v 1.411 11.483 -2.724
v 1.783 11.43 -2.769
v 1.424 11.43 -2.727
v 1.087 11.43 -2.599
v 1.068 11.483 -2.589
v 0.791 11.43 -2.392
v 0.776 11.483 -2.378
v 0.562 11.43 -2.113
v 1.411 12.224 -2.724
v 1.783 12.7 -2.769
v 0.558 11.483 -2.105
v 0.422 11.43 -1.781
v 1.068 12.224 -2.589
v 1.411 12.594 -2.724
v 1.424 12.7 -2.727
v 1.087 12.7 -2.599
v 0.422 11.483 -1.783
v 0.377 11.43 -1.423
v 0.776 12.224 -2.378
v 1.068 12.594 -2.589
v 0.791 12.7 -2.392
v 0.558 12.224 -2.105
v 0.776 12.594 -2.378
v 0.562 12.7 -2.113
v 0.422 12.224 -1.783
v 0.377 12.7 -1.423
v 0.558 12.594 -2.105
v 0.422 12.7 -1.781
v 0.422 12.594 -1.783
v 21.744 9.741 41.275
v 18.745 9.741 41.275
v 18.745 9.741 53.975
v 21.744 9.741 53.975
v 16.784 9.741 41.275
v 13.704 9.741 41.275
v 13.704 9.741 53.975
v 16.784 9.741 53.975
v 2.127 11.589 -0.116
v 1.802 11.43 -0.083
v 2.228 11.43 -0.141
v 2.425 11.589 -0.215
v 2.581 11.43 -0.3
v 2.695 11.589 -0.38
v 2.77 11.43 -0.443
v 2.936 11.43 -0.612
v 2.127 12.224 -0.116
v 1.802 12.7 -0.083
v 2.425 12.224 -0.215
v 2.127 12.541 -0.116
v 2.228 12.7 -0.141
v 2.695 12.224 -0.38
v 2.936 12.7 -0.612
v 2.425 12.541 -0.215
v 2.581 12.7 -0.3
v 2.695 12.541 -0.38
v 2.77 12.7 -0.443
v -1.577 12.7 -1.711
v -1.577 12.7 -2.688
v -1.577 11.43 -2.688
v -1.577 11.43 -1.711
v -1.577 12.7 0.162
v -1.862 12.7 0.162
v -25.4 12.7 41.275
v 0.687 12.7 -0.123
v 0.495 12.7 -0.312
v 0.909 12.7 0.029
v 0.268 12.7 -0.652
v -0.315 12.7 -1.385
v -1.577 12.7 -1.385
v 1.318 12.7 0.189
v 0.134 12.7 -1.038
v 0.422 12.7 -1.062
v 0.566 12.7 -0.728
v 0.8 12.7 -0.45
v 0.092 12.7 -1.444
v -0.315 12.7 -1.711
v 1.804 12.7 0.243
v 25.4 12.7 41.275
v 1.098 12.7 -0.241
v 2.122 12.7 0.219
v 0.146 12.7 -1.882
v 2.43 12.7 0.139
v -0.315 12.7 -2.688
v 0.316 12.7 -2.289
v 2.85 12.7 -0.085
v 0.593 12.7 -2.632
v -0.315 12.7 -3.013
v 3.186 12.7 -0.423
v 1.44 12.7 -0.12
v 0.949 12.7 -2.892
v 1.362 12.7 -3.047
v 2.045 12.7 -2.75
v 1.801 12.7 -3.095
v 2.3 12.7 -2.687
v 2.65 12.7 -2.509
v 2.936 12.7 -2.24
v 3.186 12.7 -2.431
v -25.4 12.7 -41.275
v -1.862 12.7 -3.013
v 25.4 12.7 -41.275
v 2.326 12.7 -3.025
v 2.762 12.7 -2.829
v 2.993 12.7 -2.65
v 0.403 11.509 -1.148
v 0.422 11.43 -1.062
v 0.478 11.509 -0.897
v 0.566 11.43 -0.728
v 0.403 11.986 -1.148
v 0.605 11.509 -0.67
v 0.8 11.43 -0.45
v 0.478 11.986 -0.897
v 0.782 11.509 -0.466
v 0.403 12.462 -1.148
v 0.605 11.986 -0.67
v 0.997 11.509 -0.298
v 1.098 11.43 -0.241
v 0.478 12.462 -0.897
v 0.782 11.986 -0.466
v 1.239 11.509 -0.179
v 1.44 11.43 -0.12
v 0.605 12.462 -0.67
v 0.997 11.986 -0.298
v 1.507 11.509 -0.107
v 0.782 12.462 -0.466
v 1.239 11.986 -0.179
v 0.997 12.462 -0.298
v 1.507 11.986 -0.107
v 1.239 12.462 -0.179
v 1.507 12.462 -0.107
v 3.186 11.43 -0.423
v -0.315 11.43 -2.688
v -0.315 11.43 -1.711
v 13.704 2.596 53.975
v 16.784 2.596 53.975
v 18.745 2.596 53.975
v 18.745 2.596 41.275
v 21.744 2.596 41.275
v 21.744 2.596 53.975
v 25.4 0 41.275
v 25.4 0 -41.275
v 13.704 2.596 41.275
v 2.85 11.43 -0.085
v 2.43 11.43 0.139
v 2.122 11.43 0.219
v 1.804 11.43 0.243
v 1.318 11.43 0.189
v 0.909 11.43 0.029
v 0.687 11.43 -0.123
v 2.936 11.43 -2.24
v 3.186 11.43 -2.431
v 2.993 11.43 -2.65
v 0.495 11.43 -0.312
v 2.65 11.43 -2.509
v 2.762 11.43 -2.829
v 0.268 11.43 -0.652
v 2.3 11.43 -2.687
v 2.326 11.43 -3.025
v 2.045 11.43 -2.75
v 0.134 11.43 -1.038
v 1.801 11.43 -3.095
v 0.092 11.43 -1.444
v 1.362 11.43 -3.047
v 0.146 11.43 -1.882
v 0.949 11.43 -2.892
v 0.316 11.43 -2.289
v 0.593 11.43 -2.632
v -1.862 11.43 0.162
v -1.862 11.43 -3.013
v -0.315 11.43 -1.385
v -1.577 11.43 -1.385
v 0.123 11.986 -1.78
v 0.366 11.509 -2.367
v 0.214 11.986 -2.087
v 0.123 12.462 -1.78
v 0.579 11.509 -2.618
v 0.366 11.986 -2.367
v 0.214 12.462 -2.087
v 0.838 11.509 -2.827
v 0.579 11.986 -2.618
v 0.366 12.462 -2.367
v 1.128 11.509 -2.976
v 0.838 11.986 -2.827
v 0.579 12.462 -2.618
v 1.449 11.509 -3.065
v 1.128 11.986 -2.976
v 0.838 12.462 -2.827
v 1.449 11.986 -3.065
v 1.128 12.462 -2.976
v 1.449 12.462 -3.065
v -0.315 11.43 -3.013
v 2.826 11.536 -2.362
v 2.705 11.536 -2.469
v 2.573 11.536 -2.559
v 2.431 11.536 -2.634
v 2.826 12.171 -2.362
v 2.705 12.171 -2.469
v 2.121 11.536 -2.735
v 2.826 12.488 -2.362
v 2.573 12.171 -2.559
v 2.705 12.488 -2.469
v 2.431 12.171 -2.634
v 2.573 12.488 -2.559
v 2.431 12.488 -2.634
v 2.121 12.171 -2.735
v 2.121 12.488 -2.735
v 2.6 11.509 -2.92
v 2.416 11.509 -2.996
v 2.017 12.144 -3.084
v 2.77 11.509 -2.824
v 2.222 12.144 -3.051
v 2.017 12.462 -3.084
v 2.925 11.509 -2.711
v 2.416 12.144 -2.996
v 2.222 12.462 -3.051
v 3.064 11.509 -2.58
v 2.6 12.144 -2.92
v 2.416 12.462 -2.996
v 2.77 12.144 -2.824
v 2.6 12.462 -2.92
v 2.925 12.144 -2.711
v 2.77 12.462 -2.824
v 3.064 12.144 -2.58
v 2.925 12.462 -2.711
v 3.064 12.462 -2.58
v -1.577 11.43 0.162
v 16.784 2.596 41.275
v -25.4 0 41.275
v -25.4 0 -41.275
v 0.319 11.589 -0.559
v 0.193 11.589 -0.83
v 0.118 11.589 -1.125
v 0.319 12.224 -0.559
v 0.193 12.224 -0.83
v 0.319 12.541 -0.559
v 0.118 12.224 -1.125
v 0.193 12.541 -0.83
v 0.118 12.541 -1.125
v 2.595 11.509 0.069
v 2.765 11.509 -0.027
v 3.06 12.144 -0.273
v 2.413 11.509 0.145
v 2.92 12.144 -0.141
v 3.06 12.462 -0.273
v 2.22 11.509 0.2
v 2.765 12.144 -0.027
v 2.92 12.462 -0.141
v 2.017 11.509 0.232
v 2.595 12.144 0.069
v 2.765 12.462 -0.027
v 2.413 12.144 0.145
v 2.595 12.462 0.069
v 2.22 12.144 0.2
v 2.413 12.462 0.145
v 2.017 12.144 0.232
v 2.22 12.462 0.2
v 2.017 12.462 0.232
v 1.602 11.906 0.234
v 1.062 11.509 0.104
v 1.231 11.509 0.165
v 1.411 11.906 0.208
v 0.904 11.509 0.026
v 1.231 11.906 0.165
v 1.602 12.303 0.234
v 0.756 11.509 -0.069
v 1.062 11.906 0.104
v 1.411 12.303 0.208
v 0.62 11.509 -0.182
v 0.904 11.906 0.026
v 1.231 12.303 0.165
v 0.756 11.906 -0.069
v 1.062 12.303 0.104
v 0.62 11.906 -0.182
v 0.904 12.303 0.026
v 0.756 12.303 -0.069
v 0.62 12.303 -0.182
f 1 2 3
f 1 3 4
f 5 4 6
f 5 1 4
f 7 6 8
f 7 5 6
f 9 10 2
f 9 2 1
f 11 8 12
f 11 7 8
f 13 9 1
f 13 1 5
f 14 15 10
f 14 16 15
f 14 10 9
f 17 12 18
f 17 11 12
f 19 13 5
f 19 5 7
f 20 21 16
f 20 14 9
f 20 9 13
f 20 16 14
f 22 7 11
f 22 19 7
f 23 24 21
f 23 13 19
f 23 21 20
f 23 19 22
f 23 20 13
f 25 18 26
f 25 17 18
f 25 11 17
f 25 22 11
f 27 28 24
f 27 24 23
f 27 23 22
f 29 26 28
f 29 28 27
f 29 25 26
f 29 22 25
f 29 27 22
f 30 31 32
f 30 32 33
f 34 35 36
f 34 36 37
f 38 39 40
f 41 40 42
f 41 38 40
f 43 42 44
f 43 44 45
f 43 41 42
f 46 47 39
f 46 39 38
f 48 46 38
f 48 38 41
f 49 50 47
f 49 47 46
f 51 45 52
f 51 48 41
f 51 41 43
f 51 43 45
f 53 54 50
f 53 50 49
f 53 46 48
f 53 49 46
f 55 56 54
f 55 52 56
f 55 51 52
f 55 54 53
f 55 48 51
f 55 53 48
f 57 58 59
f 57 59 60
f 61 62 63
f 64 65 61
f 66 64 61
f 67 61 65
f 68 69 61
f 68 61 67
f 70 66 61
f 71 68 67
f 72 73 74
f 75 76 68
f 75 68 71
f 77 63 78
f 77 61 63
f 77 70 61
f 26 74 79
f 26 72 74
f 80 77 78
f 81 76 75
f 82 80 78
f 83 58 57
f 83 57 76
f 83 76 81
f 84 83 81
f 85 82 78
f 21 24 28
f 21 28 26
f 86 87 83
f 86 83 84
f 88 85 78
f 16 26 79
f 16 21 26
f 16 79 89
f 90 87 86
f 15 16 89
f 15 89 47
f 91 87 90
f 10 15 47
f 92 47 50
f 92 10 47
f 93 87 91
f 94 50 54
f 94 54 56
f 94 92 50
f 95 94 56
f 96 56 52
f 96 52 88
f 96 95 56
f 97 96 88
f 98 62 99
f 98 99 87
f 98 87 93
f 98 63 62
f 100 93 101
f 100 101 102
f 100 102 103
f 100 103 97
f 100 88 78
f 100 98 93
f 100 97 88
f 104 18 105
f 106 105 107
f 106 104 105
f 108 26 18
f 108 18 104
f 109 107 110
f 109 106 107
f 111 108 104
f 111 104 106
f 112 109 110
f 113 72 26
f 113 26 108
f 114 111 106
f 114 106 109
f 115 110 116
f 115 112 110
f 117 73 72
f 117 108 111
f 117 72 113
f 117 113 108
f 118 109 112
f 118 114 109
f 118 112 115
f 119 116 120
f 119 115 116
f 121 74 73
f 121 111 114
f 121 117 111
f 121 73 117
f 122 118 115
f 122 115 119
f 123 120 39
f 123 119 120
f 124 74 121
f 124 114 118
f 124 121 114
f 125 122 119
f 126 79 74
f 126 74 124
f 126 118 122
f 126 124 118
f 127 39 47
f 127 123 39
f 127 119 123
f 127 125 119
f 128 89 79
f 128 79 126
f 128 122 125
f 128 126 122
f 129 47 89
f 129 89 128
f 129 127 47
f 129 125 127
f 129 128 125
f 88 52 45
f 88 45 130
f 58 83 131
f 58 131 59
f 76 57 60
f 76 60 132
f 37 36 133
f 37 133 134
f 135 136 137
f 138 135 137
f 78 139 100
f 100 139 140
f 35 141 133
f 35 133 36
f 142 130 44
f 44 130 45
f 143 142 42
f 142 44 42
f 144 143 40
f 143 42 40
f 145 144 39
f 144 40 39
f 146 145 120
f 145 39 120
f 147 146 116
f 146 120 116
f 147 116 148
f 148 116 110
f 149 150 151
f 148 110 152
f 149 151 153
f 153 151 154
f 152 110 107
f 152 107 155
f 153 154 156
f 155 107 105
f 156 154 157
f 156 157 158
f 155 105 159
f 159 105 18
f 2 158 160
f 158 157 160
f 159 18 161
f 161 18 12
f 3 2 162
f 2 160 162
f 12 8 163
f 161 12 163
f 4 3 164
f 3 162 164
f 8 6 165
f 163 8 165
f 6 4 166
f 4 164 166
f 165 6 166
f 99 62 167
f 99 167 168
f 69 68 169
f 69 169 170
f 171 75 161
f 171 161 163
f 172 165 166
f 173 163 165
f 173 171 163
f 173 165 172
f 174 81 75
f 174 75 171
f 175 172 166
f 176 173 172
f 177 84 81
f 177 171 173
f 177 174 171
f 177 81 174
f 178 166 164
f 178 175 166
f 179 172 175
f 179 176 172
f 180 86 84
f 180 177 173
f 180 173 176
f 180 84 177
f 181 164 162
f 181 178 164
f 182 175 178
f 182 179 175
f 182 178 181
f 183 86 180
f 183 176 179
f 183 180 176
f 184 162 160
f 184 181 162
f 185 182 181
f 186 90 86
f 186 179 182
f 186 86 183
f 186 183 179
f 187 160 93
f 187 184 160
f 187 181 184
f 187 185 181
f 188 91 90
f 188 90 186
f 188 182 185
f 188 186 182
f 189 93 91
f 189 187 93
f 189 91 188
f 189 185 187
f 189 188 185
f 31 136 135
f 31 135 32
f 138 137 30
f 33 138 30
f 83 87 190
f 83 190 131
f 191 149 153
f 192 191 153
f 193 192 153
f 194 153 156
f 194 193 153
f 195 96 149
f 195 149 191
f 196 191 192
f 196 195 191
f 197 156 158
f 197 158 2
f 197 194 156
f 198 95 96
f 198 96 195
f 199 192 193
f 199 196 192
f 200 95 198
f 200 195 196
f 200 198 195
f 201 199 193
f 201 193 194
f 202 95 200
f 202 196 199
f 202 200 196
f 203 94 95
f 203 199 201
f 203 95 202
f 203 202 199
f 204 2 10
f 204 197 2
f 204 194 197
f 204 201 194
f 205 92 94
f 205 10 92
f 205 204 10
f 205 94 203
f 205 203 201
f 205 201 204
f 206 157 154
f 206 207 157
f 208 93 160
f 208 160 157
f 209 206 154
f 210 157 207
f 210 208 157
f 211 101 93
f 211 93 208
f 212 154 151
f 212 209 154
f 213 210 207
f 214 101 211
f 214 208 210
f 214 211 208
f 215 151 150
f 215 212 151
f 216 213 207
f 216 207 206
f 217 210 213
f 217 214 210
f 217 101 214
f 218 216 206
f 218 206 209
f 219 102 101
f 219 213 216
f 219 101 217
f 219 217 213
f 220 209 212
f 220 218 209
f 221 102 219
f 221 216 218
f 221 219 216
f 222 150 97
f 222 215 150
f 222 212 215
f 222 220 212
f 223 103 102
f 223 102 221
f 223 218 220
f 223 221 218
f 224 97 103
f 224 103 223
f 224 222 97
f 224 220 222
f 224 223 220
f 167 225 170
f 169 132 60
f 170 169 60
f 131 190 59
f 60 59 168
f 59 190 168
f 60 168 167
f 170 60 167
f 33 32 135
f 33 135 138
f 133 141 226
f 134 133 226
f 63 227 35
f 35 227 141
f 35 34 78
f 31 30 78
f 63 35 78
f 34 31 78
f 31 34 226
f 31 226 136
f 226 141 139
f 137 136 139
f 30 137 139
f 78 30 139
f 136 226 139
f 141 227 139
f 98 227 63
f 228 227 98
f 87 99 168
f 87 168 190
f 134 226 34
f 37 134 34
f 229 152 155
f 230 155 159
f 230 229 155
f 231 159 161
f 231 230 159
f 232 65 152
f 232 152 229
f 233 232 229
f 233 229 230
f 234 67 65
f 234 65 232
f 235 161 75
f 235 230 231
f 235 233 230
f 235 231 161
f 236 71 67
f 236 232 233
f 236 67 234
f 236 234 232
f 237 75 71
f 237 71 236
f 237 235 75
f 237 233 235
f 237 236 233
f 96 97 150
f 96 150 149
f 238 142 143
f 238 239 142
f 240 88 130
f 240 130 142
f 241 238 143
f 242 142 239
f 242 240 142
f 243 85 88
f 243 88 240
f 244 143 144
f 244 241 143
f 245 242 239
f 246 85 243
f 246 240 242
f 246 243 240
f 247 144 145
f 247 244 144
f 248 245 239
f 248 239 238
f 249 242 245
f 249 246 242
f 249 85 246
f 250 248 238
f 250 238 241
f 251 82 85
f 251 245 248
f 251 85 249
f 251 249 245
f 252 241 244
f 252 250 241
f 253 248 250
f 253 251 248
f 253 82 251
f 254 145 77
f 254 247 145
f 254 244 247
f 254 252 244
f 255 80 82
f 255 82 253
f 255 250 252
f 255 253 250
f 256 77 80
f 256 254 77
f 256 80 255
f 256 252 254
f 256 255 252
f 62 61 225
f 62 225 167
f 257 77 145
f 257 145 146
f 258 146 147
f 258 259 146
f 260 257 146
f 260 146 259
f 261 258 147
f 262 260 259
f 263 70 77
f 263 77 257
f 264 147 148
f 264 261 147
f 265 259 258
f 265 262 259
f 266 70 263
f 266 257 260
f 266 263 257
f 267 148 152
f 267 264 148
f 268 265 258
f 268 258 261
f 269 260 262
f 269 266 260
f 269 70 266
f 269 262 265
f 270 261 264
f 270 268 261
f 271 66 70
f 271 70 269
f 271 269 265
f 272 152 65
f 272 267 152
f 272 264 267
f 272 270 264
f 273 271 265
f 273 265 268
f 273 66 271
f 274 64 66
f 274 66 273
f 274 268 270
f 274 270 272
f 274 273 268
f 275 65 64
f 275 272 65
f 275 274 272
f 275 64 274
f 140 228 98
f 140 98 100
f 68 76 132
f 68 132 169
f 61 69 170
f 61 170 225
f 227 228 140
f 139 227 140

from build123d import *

# Parameters (mm, degrees)
SKETCH1_W           = 50.8
SKETCH1_H           = 82.55
BOSS_EXTRUDE1_DEPTH = 12.7
CUT_EXTRUDE1_DEPTH  = 1.27
SKETCH3_W           = 2.998982734
SKETCH3_H           = 7.14554636
SKETCH3_W_2         = 3.079931229
BOSS_EXTRUDE2_DEPTH = 12.7


with BuildPart() as part:
    # Sketch1 → Boss-Extrude1 (new body)
    with BuildSketch(Plane(origin=(0, 0, 0), x_dir=(1, 0, 0), z_dir=(0, 1, 0))):
        Rectangle(SKETCH1_W, SKETCH1_H)
    extrude(amount=BOSS_EXTRUDE1_DEPTH)

    # Sketch2 → Cut-Extrude1 (cut)
    with BuildSketch(Plane(origin=(0, 12.7, 0), x_dir=(1, 0, 0), z_dir=(0, 1, 0))):
        Polygon((-1.861676083, 3.013416612), (-0.314881211, 3.013416612), (-0.314881211, 2.687775586), (-1.576740185, 2.687775586), (-1.576740185, 1.710852509), (-0.314881211, 1.710852509), (-0.314881211, 1.385211483), (-1.576740185, 1.385211483), (-1.576740185, -0.161583388), (-1.861676083, -0.161583388), align=None)
        with BuildLine():
            Line((3.185759815, 2.430824464), (2.936440905, 2.240019176))
            add(Edge.make_bspline(
                [(2.936440905, 2.240019176), (2.918655563, 2.261215448), (2.883324665, 2.303322222), (2.826483817, 2.36244938), (2.767245898, 2.417844296), (2.705633552, 2.469770858), (2.64053778, 2.51641321), (2.573535484, 2.560201996), (2.503505828, 2.599452015), (2.406666755, 2.647043439), (2.279986207, 2.696706022), (2.120515174, 2.73834681), (1.954044392, 2.764854591), (1.840472284, 2.767725555), (1.782704927, 2.769185842)],
                knots=[0, 0, 0, 0, 0.757959112, 1.505699292, 2.245454638, 2.979532153, 3.711538275, 4.438200793, 5.171680507, 5.909471876, 7.393775596, 8.890124382, 10.418191784, 12, 12, 12, 12], degree=3))
            add(Edge.make_bspline(
                [(1.782704927, 2.769185842), (1.750879363, 2.768819391), (1.687523605, 2.768089888), (1.593499633, 2.758465896), (1.501231365, 2.744939298), (1.410778821, 2.724868469), (1.322257137, 2.699493308), (1.235087601, 2.669171682), (1.150532271, 2.631656935), (1.06742144, 2.590193013), (0.987793156, 2.543359546), (0.912450363, 2.492275291), (0.841667849, 2.437511896), (0.775389622, 2.378864107), (0.713547926, 2.316596042), (0.656590866, 2.250044104), (0.604715529, 2.179421061), (0.556893657, 2.105658184), (0.514064963, 2.02897033), (0.478205715, 1.949073659), (0.446451069, 1.867336366), (0.421323898, 1.782834956), (0.40143523, 1.696164018), (0.387712278, 1.607090946), (0.378197736, 1.515801822), (0.377471861, 1.453926232), (0.377105969, 1.422736523)],
                knots=[0, 0, 0, 0, 1.054917814, 2.100044995, 3.131103042, 4.146048494, 5.169673617, 6.183595914, 7.203665975, 8.234915748, 9.262203917, 10.264457458, 11.251630812, 12.227803204, 13.197192746, 14.159520551, 15.12972552, 16.100847026, 17.073214652, 18.039054194, 19.002613845, 19.979014051, 20.95965708, 21.949030935, 22.966165397, 24, 24, 24, 24], degree=3))
            add(Edge.make_bspline(
                [(0.377105969, 1.422736523), (0.378250619, 1.375808826), (0.380497988, 1.283672517), (0.400498976, 1.14871632), (0.430892881, 1.019429709), (0.476445582, 0.896620852), (0.532615007, 0.778775413), (0.603590419, 0.66788731), (0.685792563, 0.562280855), (0.780384358, 0.464451896), (0.884166777, 0.375085873), (0.995516668, 0.296390703), (1.114156701, 0.230790774), (1.23877693, 0.176202594), (1.370336333, 0.134241134), (1.508598332, 0.104700822), (1.653262214, 0.085431129), (1.752113026, 0.083586284), (1.802421474, 0.082647381)],
                knots=[0, 0, 0, 0, 1.029171465, 2.020641659, 2.987623507, 3.938342917, 4.889210282, 5.84687017, 6.821220943, 7.821438502, 8.827599549, 9.822697543, 10.807740252, 11.797342354, 12.80366471, 13.83203677, 14.896651826, 16, 16, 16, 16], degree=3))
            add(Edge.make_bspline(
                [(1.802421474, 0.082647381), (1.857850341, 0.084179345), (1.966947613, 0.087194618), (2.126938608, 0.11273908), (2.280096767, 0.154157334), (2.426430328, 0.212121877), (2.565526757, 0.28747396), (2.697603727, 0.37882132), (2.822772723, 0.487032879), (2.89803953, 0.569658288), (2.936440905, 0.611814047)],
                knots=[0, 0, 0, 0, 1.028121516, 2.023589091, 2.998037872, 3.967518031, 4.937445131, 5.927275754, 6.942489185, 8, 8, 8, 8], degree=3))
            Line((2.936440905, 0.611814047), (3.185759815, 0.422916812))
            add(Edge.make_bspline(
                [(3.185759815, 0.422916812), (3.16569553, 0.397028359), (3.125663066, 0.345375458), (3.060840436, 0.27255755), (2.992553173, 0.204064603), (2.920294065, 0.140448832), (2.844894354, 0.080437281), (2.765000185, 0.025734906), (2.681661848, -0.024421825), (2.595161714, -0.070347678), (2.505591686, -0.111094038), (2.413059092, -0.145977098), (2.317962784, -0.176026105), (2.220298416, -0.200747505), (2.119863408, -0.220043417), (2.017020192, -0.232942693), (1.911546805, -0.241780001), (1.84038923, -0.242585468), (1.804329526, -0.242993645)],
                knots=[0, 0, 0, 0, 0.986787822, 1.968848986, 2.935600012, 3.899624008, 4.868462664, 5.837806735, 6.815139263, 7.798259679, 8.787526145, 9.778297419, 10.776456485, 11.791383307, 12.812564526, 13.85620153, 14.913611965, 16, 16, 16, 16], degree=3))
            add(Edge.make_bspline(
                [(1.804329526, -0.242993645), (1.770181343, -0.24275598), (1.702657538, -0.242286028), (1.602963671, -0.234673133), (1.505908837, -0.224286586), (1.411770426, -0.208647324), (1.32003472, -0.190192101), (1.231533333, -0.165453176), (1.145395392, -0.137740717), (1.061966969, -0.105169765), (0.981177098, -0.0684158), (0.903286355, -0.026876314), (0.828330563, 0.019099377), (0.755572788, 0.068497851), (0.686087837, 0.122905832), (0.619273568, 0.181567708), (0.554755321, 0.24428576), (0.5148386, 0.289511234), (0.49476923, 0.312249745)],
                knots=[0, 0, 0, 0, 1.114604814, 2.203992996, 3.262667896, 4.300477797, 5.318619304, 6.316056647, 7.298880507, 8.271930387, 9.238335007, 10.195173496, 11.151986948, 12.108099108, 13.064862484, 14.031167946, 15.010108607, 16, 16, 16, 16], degree=3))
            add(Edge.make_bspline(
                [(0.49476923, 0.312249745), (0.462624039, 0.351747823), (0.398721742, 0.430267125), (0.316964872, 0.557526551), (0.246981019, 0.69039414), (0.190397148, 0.829567933), (0.146162382, 0.974735634), (0.115518013, 1.125970422), (0.095604771, 1.283131055), (0.093327581, 1.390025856), (0.092170071, 1.444361123)],
                knots=[0, 0, 0, 0, 0.994628077, 1.977248131, 2.950237994, 3.925870899, 4.908910175, 5.911660606, 6.938484602, 8, 8, 8, 8], degree=3))
            add(Edge.make_bspline(
                [(0.092170071, 1.444361123), (0.093580854, 1.501470713), (0.096356481, 1.613830266), (0.119938381, 1.778725209), (0.157874003, 1.936705407), (0.211755467, 2.087475946), (0.280068178, 2.231829843), (0.364456606, 2.368664365), (0.463940371, 2.498854605), (0.577739236, 2.620425129), (0.702532462, 2.731585828), (0.836171672, 2.829381455), (0.978395295, 2.910768059), (1.127636489, 2.978800292), (1.285012786, 3.031092055), (1.450188413, 3.06769816), (1.622853, 3.090482973), (1.740656772, 3.09336334), (1.800513421, 3.094826868)],
                knots=[0, 0, 0, 0, 1.032925535, 2.032216505, 3.007276963, 3.968222605, 4.92396291, 5.891752235, 6.871517503, 7.883894988, 8.900124299, 9.891468569, 10.874487609, 11.85992873, 12.854644235, 13.869047385, 14.917252991, 16, 16, 16, 16], degree=3))
            add(Edge.make_bspline(
                [(1.800513421, 3.094826868), (1.836993692, 3.0943895), (1.909202714, 3.093523773), (2.016021192, 3.085081773), (2.12001816, 3.071008716), (2.221265265, 3.051853424), (2.320255067, 3.02807964), (2.416231, 2.997109512), (2.509756237, 2.961697801), (2.600240932, 2.92091405), (2.687250946, 2.875133506), (2.770759177, 2.824863619), (2.850102299, 2.77016671), (2.925838612, 2.711507972), (2.996701175, 2.647646422), (3.064701944, 2.580338603), (3.127531637, 2.507645776), (3.166314892, 2.456478444), (3.185759815, 2.430824464)],
                knots=[0, 0, 0, 0, 1.096760587, 2.17092713, 3.219439832, 4.250915756, 5.268269357, 6.278326846, 7.281116186, 8.274029601, 9.260640565, 10.235837813, 11.203064059, 12.156899882, 13.114053108, 14.069676657, 15.032185724, 16, 16, 16, 16], degree=3))
        make_face()
    extrude(amount=-CUT_EXTRUDE1_DEPTH, mode=Mode.SUBTRACT)

    # Sketch3 → Boss-Extrude2 (add)
    with BuildSketch(Plane.XY.offset(41.275)):
        with Locations((20.244451429, 6.168632911)):
            Rectangle(SKETCH3_W, SKETCH3_H)
        with Locations((15.24371534, 6.168632911)):
            Rectangle(SKETCH3_W_2, SKETCH3_H)
    extrude(amount=BOSS_EXTRUDE2_DEPTH)


solid = part.part
